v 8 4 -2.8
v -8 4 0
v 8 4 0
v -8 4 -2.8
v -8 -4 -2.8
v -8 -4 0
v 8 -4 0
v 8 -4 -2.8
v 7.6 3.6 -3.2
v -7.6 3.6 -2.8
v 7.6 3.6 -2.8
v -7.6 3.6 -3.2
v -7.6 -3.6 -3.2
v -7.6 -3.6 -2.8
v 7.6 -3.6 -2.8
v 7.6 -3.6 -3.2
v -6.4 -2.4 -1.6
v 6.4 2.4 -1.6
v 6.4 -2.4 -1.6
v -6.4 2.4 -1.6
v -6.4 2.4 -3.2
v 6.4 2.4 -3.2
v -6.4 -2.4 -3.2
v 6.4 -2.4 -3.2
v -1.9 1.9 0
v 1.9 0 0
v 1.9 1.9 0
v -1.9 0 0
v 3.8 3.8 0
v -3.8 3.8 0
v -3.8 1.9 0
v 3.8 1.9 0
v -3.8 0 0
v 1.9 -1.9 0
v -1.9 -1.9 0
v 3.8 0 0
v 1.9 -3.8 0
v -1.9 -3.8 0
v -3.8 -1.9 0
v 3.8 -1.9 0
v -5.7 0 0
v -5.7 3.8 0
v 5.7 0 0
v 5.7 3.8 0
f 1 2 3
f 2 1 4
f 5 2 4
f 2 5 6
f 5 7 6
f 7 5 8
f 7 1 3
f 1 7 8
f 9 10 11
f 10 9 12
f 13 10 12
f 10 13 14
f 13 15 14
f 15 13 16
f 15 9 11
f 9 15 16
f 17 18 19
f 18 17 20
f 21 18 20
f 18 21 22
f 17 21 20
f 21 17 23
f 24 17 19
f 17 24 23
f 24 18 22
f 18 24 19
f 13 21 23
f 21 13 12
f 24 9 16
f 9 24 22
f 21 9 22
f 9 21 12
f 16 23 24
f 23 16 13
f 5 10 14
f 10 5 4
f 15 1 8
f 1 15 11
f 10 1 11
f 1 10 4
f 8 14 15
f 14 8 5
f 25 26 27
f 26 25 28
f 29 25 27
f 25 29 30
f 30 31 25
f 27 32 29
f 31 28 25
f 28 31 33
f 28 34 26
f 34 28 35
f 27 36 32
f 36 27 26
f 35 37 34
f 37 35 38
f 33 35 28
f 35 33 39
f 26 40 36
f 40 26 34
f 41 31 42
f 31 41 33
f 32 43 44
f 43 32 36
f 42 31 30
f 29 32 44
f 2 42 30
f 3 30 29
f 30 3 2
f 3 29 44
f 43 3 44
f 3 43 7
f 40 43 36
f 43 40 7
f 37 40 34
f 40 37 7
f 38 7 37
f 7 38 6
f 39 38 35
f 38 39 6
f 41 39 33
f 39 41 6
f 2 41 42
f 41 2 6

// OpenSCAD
// file: ../p/box5.scad
use <../lib.scad>
function ldraw_lib__box5() = [
// 0 Box with 5 Faces and All Edges
// 0 Name: box5.dat
// 0 Author: James Jessiman
// 0 !LDRAW_ORG Primitive UPDATE 2012-01
// 0 !LICENSE Licensed under CC BY 4.0 : see CAreadme.txt
// 
// 0 BFC CERTIFY CCW
  [0,"BFC","CERTIFY"],
  [0,"BFC","CCW"],
// 
// 0 !HISTORY 2002-04-03 [sbliss] Modified for BFC compliance
// 0 !HISTORY 2002-04-25 [PTadmin] Official Update 2002-02
// 0 !HISTORY 2007-06-24 [PTadmin] Header formatted for Contributor Agreement
// 0 !HISTORY 2008-07-01 [PTadmin] Official Update 2008-01
// 0 !HISTORY 2012-02-16 [Philo] Changed to CCW
// 0 !HISTORY 2012-03-30 [PTadmin] Official Update 2012-01
// 
// 
// 2 24 1 1 1 -1 1 1
  [2,24,1,1,1,-1,1,1],
// 2 24 -1 1 1 -1 1 -1
  [2,24,-1,1,1,-1,1,-1],
// 2 24 -1 1 -1 1 1 -1
  [2,24,-1,1,-1,1,1,-1],
// 2 24 1 1 -1 1 1 1
  [2,24,1,1,-1,1,1,1],
// 2 24 1 0 1 -1 0 1
  [2,24,1,0,1,-1,0,1],
// 2 24 -1 0 1 -1 0 -1
  [2,24,-1,0,1,-1,0,-1],
// 2 24 -1 0 -1 1 0 -1
  [2,24,-1,0,-1,1,0,-1],
// 2 24 1 0 -1 1 0 1
  [2,24,1,0,-1,1,0,1],
// 2 24 1 0 1 1 1 1
  [2,24,1,0,1,1,1,1],
// 2 24 -1 0 1 -1 1 1
  [2,24,-1,0,1,-1,1,1],
// 2 24 1 0 -1 1 1 -1
  [2,24,1,0,-1,1,1,-1],
// 2 24 -1 0 -1 -1 1 -1
  [2,24,-1,0,-1,-1,1,-1],
// 4 16 -1 1 1 1 1 1 1 1 -1 -1 1 -1
  [4,16,-1,1,1,1,1,1,1,1,-1,-1,1,-1],
// 4 16 -1 1 1 -1 0 1 1 0 1 1 1 1
  [4,16,-1,1,1,-1,0,1,1,0,1,1,1,1],
// 4 16 -1 1 -1 -1 0 -1 -1 0 1 -1 1 1
  [4,16,-1,1,-1,-1,0,-1,-1,0,1,-1,1,1],
// 4 16 1 1 -1 1 0 -1 -1 0 -1 -1 1 -1
  [4,16,1,1,-1,1,0,-1,-1,0,-1,-1,1,-1],
// 4 16 1 1 1 1 0 1 1 0 -1 1 1 -1
  [4,16,1,1,1,1,0,1,1,0,-1,1,1,-1],
];
module ldraw_lib__box5(step=0, col=false, unit=2/5, alt=false, line=0.2, solid=!$preview)
    makepoly(ldraw_lib__box5(), step=step, col=col, unit=unit, alt=alt, line=line, solid=solid);
ldraw_lib__box5(line=0.2);
// file: ../p/box4.scad
use <../lib.scad>
function ldraw_lib__box4() = [
// 0 Box with 4 Faces (2 Parallel Pairs) and All Edges
// 0 Name: box4.dat
// 0 Author: James Jessiman
// 0 !LDRAW_ORG Primitive UPDATE 2012-01
// 0 !LICENSE Licensed under CC BY 4.0 : see CAreadme.txt
// 
// 0 BFC CERTIFY CCW
  [0,"BFC","CERTIFY"],
  [0,"BFC","CCW"],
// 
// 0 !HISTORY 2002-04-03 [sbliss] Modified for BFC compliance
// 0 !HISTORY 2002-04-25 [PTadmin] Official Update 2002-02
// 0 !HISTORY 2007-06-24 [PTadmin] Header formatted for Contributor Agreement
// 0 !HISTORY 2008-07-01 [PTadmin] Official Update 2008-01
// 0 !HISTORY 2012-02-16 [Philo] Changed to CCW
// 0 !HISTORY 2012-03-30 [PTadmin] Official Update 2012-01
// 
// 
// 2 24 1 1 1 -1 1 1
  [2,24,1,1,1,-1,1,1],
// 2 24 -1 1 1 -1 1 -1
  [2,24,-1,1,1,-1,1,-1],
// 2 24 -1 1 -1 1 1 -1
  [2,24,-1,1,-1,1,1,-1],
// 2 24 1 1 -1 1 1 1
  [2,24,1,1,-1,1,1,1],
// 2 24 1 0 1 -1 0 1
  [2,24,1,0,1,-1,0,1],
// 2 24 -1 0 1 -1 0 -1
  [2,24,-1,0,1,-1,0,-1],
// 2 24 -1 0 -1 1 0 -1
  [2,24,-1,0,-1,1,0,-1],
// 2 24 1 0 -1 1 0 1
  [2,24,1,0,-1,1,0,1],
// 2 24 1 0 1 1 1 1
  [2,24,1,0,1,1,1,1],
// 2 24 -1 0 1 -1 1 1
  [2,24,-1,0,1,-1,1,1],
// 2 24 1 0 -1 1 1 -1
  [2,24,1,0,-1,1,1,-1],
// 2 24 -1 0 -1 -1 1 -1
  [2,24,-1,0,-1,-1,1,-1],
// 4 16 -1 1 1 -1 0 1 1 0 1 1 1 1
  [4,16,-1,1,1,-1,0,1,1,0,1,1,1,1],
// 4 16 -1 1 -1 -1 0 -1 -1 0 1 -1 1 1
  [4,16,-1,1,-1,-1,0,-1,-1,0,1,-1,1,1],
// 4 16 1 1 -1 1 0 -1 -1 0 -1 -1 1 -1
  [4,16,1,1,-1,1,0,-1,-1,0,-1,-1,1,-1],
// 4 16 1 1 1 1 0 1 1 0 -1 1 1 -1
  [4,16,1,1,1,1,0,1,1,0,-1,1,1,-1],
];
module ldraw_lib__box4(step=0, col=false, unit=2/5, alt=false, line=0.2, solid=!$preview)
    makepoly(ldraw_lib__box4(), step=step, col=col, unit=unit, alt=alt, line=line, solid=solid);
ldraw_lib__box4(line=0.2);
// file: s/3069bs01.scad
use <../../lib.scad>
use <../../p/box4.scad>
use <../../p/box5.scad>
function ldraw_lib__s__3069bs01() = [
// 0 ~Tile  1 x  2 with Groove without Top Face
// 0 Name: s\3069bs01.dat
// 0 Author: Santeri Piippo [arezey]
// 0 !LDRAW_ORG Subpart UPDATE 2010-02
// 0 !LICENSE Licensed under CC BY 4.0 : see CAreadme.txt
// 
// 0 BFC CERTIFY CCW
  [0,"BFC","CERTIFY"],
  [0,"BFC","CCW"],
// 
// 0 !HISTORY 2010-07-05 [PTadmin] Official Update 2010-02
// 
// 
// 1 16 0 0 0 20 0 0 0 7 0 0 0 10 box4.dat
  [1,16,0,0,0,20,0,0,0,7,0,0,0,10, ldraw_lib__box4()],
// 1 16 0 7 0 19 0 0 0 1 0 0 0 9 box4.dat
  [1,16,0,7,0,19,0,0,0,1,0,0,0,9, ldraw_lib__box4()],
// 0 BFC INVERTNEXT
  [0,"BFC","INVERTNEXT"],
// 1 16 0 8 0 16 0 0 0 -4 0 0 0 6 box5.dat
  [1,16,0,8,0,16,0,0,0,-4,0,0,0,6, ldraw_lib__box5()],
// 4 16 -19 8 9 -16 8 6 -16 8 -6 -19 8 -9
  [4,16,-19,8,9,-16,8,6,-16,8,-6,-19,8,-9],
// 4 16 19 8 -9 16 8 -6 16 8 6 19 8 9
  [4,16,19,8,-9,16,8,-6,16,8,6,19,8,9],
// 4 16 19 8 9 16 8 6 -16 8 6 -19 8 9
  [4,16,19,8,9,16,8,6,-16,8,6,-19,8,9],
// 4 16 -19 8 -9 -16 8 -6 16 8 -6 19 8 -9
  [4,16,-19,8,-9,-16,8,-6,16,8,-6,19,8,-9],
// 4 16 -20 7 10 -19 7 9 -19 7 -9 -20 7 -10
  [4,16,-20,7,10,-19,7,9,-19,7,-9,-20,7,-10],
// 4 16 20 7 -10 19 7 -9 19 7 9 20 7 10
  [4,16,20,7,-10,19,7,-9,19,7,9,20,7,10],
// 4 16 20 7 10 19 7 9 -19 7 9 -20 7 10
  [4,16,20,7,10,19,7,9,-19,7,9,-20,7,10],
// 4 16 -20 7 -10 -19 7 -9 19 7 -9 20 7 -10
  [4,16,-20,7,-10,-19,7,-9,19,7,-9,20,7,-10],
// 0 //
];
module ldraw_lib__s__3069bs01(step=0, col=false, unit=2/5, alt=false, line=0.2, solid=!$preview)
    makepoly(ldraw_lib__s__3069bs01(), step=step, col=col, unit=unit, alt=alt, line=line, solid=solid);
ldraw_lib__s__3069bs01(line=0.2);
// main file
use <../lib.scad>
use <s/3069bs01.scad>
function ldraw_lib__3069bpx7() = [
// 0 Tile  1 x  2 with Pixelated Tongue Pattern
// 0 Name: 3069bpx7.dat
// 0 Author: Vincent Messenet [Cheenzo]
// 0 !LDRAW_ORG Part UPDATE 2022-04
// 0 !LICENSE Licensed under CC BY 4.0 : see CAreadme.txt
// 
// 0 BFC CERTIFY CCW
  [0,"BFC","CERTIFY"],
  [0,"BFC","CCW"],
// 
// 0 !KEYWORDS BrickLink 3069bpb0701, dragon, Minecraft, Set 21151
// 
// 0 !HISTORY 2022-07-18 [PTadmin] Official Update 2022-04
// 
// 
// 1 16 0 0 0 1 0 0 0 1 0 0 0 1 s\3069bs01.dat
  [1,16,0,0,0,1,0,0,0,1,0,0,0,1, ldraw_lib__s__3069bs01()],
// 
// 4 77 4.75 0 4.75 -4.75 0 4.75 -4.75 0 0 4.75 0 0
  [4,77,4.75,0,4.75,-4.75,0,4.75,-4.75,0,0,4.75,0,0],
// 4 77 -9.5 0 9.5 -4.75 0 4.75 4.75 0 4.75 9.5 0 9.5
  [4,77,-9.5,0,9.5,-4.75,0,4.75,4.75,0,4.75,9.5,0,9.5],
// 3 77 -9.5 0 9.5 -9.5 0 4.75 -4.75 0 4.75
  [3,77,-9.5,0,9.5,-9.5,0,4.75,-4.75,0,4.75],
// 3 77 4.75 0 4.75 9.5 0 4.75 9.5 0 9.5
  [3,77,4.75,0,4.75,9.5,0,4.75,9.5,0,9.5],
// 4 351 -4.75 0 0 -4.75 0 4.75 -9.5 0 4.75 -9.5 0 0
  [4,351,-4.75,0,0,-4.75,0,4.75,-9.5,0,4.75,-9.5,0,0],
// 4 351 -4.75 0 0 -4.75 0 -4.75 4.75 0 -4.75 4.75 0 0
  [4,351,-4.75,0,0,-4.75,0,-4.75,4.75,0,-4.75,4.75,0,0],
// 4 351 9.5 0 4.75 4.75 0 4.75 4.75 0 0 9.5 0 0
  [4,351,9.5,0,4.75,4.75,0,4.75,4.75,0,0,9.5,0,0],
// 4 26 -4.75 0 -4.75 -4.75 0 -9.5 4.75 0 -9.5 4.75 0 -4.75
  [4,26,-4.75,0,-4.75,-4.75,0,-9.5,4.75,0,-9.5,4.75,0,-4.75],
// 4 26 -9.5 0 -4.75 -4.75 0 -4.75 -4.75 0 0 -9.5 0 0
  [4,26,-9.5,0,-4.75,-4.75,0,-4.75,-4.75,0,0,-9.5,0,0],
// 4 26 4.75 0 0 4.75 0 -4.75 9.5 0 -4.75 9.5 0 0
  [4,26,4.75,0,0,4.75,0,-4.75,9.5,0,-4.75,9.5,0,0],
// 4 26 -14.25 0 9.5 -14.25 0 0 -9.5 0 0 -9.5 0 4.75
  [4,26,-14.25,0,9.5,-14.25,0,0,-9.5,0,0,-9.5,0,4.75],
// 4 26 9.5 0 4.75 9.5 0 0 14.25 0 0 14.25 0 9.5
  [4,26,9.5,0,4.75,9.5,0,0,14.25,0,0,14.25,0,9.5],
// 3 26 -14.25 0 9.5 -9.5 0 4.75 -9.5 0 9.5
  [3,26,-14.25,0,9.5,-9.5,0,4.75,-9.5,0,9.5],
// 3 26 9.5 0 9.5 9.5 0 4.75 14.25 0 9.5
  [3,26,9.5,0,9.5,9.5,0,4.75,14.25,0,9.5],
// 3 16 -20 0 10 -14.25 0 9.5 -9.5 0 9.5
  [3,16,-20,0,10,-14.25,0,9.5,-9.5,0,9.5],
// 4 16 -20 0 10 -9.5 0 9.5 9.5 0 9.5 20 0 10
  [4,16,-20,0,10,-9.5,0,9.5,9.5,0,9.5,20,0,10],
// 3 16 20 0 10 9.5 0 9.5 14.25 0 9.5
  [3,16,20,0,10,9.5,0,9.5,14.25,0,9.5],
// 4 16 20 0 10 14.25 0 9.5 14.25 0 0 20 0 -10
  [4,16,20,0,10,14.25,0,9.5,14.25,0,0,20,0,-10],
// 4 16 9.5 0 -4.75 20 0 -10 14.25 0 0 9.5 0 0
  [4,16,9.5,0,-4.75,20,0,-10,14.25,0,0,9.5,0,0],
// 4 16 9.5 0 -4.75 4.75 0 -4.75 4.75 0 -9.5 20 0 -10
  [4,16,9.5,0,-4.75,4.75,0,-4.75,4.75,0,-9.5,20,0,-10],
// 4 16 20 0 -10 4.75 0 -9.5 -4.75 0 -9.5 -20 0 -10
  [4,16,20,0,-10,4.75,0,-9.5,-4.75,0,-9.5,-20,0,-10],
// 4 16 -20 0 -10 -4.75 0 -9.5 -4.75 0 -4.75 -9.5 0 -4.75
  [4,16,-20,0,-10,-4.75,0,-9.5,-4.75,0,-4.75,-9.5,0,-4.75],
// 4 16 -9.5 0 -4.75 -9.5 0 0 -14.25 0 0 -20 0 -10
  [4,16,-9.5,0,-4.75,-9.5,0,0,-14.25,0,0,-20,0,-10],
// 4 16 -20 0 10 -20 0 -10 -14.25 0 0 -14.25 0 9.5
  [4,16,-20,0,10,-20,0,-10,-14.25,0,0,-14.25,0,9.5],
];
module ldraw_lib__3069bpx7(step=0, col=false, unit=2/5, alt=false, line=0.2, solid=!$preview)
    makepoly(ldraw_lib__3069bpx7(), step=step, col=col, unit=unit, alt=alt, line=line, solid=solid);
ldraw_lib__3069bpx7(line=0.2);
